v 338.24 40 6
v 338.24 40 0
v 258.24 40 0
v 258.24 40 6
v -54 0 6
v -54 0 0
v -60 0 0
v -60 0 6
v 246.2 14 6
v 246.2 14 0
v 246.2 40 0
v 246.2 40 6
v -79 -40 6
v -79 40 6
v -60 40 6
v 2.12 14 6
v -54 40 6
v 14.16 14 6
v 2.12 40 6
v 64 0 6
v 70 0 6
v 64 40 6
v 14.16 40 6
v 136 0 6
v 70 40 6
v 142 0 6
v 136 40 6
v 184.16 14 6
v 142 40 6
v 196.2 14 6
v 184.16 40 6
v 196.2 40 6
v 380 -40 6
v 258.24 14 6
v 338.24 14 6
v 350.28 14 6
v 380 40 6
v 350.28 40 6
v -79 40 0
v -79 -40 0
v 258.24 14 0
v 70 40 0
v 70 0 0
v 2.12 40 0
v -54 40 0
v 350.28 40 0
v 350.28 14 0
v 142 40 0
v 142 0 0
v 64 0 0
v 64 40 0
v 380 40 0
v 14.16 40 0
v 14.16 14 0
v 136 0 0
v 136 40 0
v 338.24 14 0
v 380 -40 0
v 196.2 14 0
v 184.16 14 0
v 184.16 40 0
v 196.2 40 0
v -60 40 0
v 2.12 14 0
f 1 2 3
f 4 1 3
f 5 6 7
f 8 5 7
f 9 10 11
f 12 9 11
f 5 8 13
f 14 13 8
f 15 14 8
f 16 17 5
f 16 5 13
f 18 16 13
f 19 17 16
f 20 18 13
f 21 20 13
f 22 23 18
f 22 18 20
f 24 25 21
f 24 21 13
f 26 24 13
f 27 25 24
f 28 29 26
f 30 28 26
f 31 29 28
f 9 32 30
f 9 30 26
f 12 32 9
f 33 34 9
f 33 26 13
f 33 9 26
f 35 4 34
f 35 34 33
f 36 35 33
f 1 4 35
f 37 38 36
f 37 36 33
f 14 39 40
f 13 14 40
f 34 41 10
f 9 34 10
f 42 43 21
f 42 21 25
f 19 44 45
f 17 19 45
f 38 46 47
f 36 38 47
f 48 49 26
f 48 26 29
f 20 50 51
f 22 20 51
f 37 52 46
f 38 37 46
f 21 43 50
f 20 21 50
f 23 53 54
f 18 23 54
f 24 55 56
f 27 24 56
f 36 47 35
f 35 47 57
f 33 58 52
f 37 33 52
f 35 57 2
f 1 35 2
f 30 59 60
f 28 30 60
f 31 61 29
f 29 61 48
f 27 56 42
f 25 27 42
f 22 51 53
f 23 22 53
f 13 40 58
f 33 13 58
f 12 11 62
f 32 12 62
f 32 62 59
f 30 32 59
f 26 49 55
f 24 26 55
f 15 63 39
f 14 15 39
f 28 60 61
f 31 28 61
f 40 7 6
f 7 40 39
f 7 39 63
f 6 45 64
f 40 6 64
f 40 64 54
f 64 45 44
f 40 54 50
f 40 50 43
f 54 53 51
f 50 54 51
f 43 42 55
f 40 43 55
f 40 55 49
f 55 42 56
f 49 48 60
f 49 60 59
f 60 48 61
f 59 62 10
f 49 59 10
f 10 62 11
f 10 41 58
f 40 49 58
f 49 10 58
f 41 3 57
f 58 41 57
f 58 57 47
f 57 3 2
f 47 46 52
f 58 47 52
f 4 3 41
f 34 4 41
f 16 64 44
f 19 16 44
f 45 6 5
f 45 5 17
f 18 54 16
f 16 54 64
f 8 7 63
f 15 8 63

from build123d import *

# Parameters (mm, degrees)
BOSS_EXTRUDE1_DEPTH = 6
SKETCH2_W           = 6
SKETCH2_H           = 40
CUT_EXTRUDE1_DEPTH  = 10


with BuildPart() as part:
    # Sketch1 → Boss-Extrude1 (new body)
    with BuildSketch(Plane.XY):
        Polygon((-79, -40), (380, -40), (380, 40), (350.28, 40), (350.28, 14), (338.24, 14), (338.24, 40), (258.24, 40), (258.24, 14), (246.2, 14), (246.2, 40), (196.2, 40), (196.2, 14), (184.16, 14), (184.16, 40), (14.16, 40), (14.16, 14), (2.12, 14), (2.12, 40), (-79, 40), align=None)
    extrude(amount=BOSS_EXTRUDE1_DEPTH)

    # Sketch2 → Cut-Extrude1 (cut)
    with BuildSketch(Plane(origin=(0, 0, 0), x_dir=(-1, 0, 0), z_dir=(0, 0, -1))):
        with Locations((-67, 20)):
            Rectangle(SKETCH2_W, SKETCH2_H)
        with Locations((57, 20)):
            Rectangle(SKETCH2_W, SKETCH2_H)
        with Locations((-139, 20)):
            Rectangle(SKETCH2_W, SKETCH2_H)
    extrude(amount=-CUT_EXTRUDE1_DEPTH, mode=Mode.SUBTRACT)


solid = part.part
